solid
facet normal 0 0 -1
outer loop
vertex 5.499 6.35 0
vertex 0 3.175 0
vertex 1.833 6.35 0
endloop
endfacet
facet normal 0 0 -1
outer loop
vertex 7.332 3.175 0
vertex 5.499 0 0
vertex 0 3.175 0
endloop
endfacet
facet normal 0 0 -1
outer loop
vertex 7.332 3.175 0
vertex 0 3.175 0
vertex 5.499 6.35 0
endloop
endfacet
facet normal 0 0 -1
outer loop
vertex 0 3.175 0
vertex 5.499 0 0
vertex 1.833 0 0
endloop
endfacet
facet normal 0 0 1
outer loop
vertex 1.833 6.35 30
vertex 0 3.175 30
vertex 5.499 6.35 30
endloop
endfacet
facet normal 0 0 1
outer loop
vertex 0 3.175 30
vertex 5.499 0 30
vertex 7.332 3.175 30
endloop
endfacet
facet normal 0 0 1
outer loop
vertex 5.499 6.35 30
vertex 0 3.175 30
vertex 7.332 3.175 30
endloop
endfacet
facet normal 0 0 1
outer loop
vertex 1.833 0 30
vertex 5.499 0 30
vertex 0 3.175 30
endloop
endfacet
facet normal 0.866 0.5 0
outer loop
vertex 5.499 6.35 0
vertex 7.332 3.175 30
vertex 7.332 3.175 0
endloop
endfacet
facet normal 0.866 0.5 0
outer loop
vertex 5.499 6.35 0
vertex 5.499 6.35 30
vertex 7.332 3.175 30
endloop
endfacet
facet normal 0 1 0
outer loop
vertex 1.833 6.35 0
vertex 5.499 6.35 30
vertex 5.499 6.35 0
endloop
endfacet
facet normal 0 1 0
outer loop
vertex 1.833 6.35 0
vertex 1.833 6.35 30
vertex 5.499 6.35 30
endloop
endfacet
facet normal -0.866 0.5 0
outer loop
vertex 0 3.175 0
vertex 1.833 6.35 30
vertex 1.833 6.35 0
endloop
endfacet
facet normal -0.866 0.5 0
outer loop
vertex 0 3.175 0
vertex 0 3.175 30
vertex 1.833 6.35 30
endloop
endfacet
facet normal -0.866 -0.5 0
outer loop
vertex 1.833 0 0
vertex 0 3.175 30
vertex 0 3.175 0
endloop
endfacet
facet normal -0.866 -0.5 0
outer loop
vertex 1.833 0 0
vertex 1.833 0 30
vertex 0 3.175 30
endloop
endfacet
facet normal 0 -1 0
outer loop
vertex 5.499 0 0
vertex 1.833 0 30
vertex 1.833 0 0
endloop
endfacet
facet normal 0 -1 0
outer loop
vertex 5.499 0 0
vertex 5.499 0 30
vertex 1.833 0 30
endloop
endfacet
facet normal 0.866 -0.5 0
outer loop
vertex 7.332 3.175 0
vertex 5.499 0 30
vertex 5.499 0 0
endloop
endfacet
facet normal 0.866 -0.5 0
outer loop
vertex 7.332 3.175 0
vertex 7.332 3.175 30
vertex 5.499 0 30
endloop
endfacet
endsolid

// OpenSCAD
$fn = 32;

// ----------------------------------------------------------------------
// Key bar: hex key, 30 mm thick
// ----------------------------------------------------------------------

// --- parameters (mm) ---
profile_height = 30;      // extrusion height
profile_points = 6;       // points of the closed outline

profile = [[7.332, 3.175], [5.499, 6.35], [1.833, 6.35], [0, 3.175], [1.833, 0], [5.499, 0]];  // single closed polygon, 6 points, counter clockwise

// --- the one profile operation ---
linear_extrude(height = profile_height) polygon(points = profile);
